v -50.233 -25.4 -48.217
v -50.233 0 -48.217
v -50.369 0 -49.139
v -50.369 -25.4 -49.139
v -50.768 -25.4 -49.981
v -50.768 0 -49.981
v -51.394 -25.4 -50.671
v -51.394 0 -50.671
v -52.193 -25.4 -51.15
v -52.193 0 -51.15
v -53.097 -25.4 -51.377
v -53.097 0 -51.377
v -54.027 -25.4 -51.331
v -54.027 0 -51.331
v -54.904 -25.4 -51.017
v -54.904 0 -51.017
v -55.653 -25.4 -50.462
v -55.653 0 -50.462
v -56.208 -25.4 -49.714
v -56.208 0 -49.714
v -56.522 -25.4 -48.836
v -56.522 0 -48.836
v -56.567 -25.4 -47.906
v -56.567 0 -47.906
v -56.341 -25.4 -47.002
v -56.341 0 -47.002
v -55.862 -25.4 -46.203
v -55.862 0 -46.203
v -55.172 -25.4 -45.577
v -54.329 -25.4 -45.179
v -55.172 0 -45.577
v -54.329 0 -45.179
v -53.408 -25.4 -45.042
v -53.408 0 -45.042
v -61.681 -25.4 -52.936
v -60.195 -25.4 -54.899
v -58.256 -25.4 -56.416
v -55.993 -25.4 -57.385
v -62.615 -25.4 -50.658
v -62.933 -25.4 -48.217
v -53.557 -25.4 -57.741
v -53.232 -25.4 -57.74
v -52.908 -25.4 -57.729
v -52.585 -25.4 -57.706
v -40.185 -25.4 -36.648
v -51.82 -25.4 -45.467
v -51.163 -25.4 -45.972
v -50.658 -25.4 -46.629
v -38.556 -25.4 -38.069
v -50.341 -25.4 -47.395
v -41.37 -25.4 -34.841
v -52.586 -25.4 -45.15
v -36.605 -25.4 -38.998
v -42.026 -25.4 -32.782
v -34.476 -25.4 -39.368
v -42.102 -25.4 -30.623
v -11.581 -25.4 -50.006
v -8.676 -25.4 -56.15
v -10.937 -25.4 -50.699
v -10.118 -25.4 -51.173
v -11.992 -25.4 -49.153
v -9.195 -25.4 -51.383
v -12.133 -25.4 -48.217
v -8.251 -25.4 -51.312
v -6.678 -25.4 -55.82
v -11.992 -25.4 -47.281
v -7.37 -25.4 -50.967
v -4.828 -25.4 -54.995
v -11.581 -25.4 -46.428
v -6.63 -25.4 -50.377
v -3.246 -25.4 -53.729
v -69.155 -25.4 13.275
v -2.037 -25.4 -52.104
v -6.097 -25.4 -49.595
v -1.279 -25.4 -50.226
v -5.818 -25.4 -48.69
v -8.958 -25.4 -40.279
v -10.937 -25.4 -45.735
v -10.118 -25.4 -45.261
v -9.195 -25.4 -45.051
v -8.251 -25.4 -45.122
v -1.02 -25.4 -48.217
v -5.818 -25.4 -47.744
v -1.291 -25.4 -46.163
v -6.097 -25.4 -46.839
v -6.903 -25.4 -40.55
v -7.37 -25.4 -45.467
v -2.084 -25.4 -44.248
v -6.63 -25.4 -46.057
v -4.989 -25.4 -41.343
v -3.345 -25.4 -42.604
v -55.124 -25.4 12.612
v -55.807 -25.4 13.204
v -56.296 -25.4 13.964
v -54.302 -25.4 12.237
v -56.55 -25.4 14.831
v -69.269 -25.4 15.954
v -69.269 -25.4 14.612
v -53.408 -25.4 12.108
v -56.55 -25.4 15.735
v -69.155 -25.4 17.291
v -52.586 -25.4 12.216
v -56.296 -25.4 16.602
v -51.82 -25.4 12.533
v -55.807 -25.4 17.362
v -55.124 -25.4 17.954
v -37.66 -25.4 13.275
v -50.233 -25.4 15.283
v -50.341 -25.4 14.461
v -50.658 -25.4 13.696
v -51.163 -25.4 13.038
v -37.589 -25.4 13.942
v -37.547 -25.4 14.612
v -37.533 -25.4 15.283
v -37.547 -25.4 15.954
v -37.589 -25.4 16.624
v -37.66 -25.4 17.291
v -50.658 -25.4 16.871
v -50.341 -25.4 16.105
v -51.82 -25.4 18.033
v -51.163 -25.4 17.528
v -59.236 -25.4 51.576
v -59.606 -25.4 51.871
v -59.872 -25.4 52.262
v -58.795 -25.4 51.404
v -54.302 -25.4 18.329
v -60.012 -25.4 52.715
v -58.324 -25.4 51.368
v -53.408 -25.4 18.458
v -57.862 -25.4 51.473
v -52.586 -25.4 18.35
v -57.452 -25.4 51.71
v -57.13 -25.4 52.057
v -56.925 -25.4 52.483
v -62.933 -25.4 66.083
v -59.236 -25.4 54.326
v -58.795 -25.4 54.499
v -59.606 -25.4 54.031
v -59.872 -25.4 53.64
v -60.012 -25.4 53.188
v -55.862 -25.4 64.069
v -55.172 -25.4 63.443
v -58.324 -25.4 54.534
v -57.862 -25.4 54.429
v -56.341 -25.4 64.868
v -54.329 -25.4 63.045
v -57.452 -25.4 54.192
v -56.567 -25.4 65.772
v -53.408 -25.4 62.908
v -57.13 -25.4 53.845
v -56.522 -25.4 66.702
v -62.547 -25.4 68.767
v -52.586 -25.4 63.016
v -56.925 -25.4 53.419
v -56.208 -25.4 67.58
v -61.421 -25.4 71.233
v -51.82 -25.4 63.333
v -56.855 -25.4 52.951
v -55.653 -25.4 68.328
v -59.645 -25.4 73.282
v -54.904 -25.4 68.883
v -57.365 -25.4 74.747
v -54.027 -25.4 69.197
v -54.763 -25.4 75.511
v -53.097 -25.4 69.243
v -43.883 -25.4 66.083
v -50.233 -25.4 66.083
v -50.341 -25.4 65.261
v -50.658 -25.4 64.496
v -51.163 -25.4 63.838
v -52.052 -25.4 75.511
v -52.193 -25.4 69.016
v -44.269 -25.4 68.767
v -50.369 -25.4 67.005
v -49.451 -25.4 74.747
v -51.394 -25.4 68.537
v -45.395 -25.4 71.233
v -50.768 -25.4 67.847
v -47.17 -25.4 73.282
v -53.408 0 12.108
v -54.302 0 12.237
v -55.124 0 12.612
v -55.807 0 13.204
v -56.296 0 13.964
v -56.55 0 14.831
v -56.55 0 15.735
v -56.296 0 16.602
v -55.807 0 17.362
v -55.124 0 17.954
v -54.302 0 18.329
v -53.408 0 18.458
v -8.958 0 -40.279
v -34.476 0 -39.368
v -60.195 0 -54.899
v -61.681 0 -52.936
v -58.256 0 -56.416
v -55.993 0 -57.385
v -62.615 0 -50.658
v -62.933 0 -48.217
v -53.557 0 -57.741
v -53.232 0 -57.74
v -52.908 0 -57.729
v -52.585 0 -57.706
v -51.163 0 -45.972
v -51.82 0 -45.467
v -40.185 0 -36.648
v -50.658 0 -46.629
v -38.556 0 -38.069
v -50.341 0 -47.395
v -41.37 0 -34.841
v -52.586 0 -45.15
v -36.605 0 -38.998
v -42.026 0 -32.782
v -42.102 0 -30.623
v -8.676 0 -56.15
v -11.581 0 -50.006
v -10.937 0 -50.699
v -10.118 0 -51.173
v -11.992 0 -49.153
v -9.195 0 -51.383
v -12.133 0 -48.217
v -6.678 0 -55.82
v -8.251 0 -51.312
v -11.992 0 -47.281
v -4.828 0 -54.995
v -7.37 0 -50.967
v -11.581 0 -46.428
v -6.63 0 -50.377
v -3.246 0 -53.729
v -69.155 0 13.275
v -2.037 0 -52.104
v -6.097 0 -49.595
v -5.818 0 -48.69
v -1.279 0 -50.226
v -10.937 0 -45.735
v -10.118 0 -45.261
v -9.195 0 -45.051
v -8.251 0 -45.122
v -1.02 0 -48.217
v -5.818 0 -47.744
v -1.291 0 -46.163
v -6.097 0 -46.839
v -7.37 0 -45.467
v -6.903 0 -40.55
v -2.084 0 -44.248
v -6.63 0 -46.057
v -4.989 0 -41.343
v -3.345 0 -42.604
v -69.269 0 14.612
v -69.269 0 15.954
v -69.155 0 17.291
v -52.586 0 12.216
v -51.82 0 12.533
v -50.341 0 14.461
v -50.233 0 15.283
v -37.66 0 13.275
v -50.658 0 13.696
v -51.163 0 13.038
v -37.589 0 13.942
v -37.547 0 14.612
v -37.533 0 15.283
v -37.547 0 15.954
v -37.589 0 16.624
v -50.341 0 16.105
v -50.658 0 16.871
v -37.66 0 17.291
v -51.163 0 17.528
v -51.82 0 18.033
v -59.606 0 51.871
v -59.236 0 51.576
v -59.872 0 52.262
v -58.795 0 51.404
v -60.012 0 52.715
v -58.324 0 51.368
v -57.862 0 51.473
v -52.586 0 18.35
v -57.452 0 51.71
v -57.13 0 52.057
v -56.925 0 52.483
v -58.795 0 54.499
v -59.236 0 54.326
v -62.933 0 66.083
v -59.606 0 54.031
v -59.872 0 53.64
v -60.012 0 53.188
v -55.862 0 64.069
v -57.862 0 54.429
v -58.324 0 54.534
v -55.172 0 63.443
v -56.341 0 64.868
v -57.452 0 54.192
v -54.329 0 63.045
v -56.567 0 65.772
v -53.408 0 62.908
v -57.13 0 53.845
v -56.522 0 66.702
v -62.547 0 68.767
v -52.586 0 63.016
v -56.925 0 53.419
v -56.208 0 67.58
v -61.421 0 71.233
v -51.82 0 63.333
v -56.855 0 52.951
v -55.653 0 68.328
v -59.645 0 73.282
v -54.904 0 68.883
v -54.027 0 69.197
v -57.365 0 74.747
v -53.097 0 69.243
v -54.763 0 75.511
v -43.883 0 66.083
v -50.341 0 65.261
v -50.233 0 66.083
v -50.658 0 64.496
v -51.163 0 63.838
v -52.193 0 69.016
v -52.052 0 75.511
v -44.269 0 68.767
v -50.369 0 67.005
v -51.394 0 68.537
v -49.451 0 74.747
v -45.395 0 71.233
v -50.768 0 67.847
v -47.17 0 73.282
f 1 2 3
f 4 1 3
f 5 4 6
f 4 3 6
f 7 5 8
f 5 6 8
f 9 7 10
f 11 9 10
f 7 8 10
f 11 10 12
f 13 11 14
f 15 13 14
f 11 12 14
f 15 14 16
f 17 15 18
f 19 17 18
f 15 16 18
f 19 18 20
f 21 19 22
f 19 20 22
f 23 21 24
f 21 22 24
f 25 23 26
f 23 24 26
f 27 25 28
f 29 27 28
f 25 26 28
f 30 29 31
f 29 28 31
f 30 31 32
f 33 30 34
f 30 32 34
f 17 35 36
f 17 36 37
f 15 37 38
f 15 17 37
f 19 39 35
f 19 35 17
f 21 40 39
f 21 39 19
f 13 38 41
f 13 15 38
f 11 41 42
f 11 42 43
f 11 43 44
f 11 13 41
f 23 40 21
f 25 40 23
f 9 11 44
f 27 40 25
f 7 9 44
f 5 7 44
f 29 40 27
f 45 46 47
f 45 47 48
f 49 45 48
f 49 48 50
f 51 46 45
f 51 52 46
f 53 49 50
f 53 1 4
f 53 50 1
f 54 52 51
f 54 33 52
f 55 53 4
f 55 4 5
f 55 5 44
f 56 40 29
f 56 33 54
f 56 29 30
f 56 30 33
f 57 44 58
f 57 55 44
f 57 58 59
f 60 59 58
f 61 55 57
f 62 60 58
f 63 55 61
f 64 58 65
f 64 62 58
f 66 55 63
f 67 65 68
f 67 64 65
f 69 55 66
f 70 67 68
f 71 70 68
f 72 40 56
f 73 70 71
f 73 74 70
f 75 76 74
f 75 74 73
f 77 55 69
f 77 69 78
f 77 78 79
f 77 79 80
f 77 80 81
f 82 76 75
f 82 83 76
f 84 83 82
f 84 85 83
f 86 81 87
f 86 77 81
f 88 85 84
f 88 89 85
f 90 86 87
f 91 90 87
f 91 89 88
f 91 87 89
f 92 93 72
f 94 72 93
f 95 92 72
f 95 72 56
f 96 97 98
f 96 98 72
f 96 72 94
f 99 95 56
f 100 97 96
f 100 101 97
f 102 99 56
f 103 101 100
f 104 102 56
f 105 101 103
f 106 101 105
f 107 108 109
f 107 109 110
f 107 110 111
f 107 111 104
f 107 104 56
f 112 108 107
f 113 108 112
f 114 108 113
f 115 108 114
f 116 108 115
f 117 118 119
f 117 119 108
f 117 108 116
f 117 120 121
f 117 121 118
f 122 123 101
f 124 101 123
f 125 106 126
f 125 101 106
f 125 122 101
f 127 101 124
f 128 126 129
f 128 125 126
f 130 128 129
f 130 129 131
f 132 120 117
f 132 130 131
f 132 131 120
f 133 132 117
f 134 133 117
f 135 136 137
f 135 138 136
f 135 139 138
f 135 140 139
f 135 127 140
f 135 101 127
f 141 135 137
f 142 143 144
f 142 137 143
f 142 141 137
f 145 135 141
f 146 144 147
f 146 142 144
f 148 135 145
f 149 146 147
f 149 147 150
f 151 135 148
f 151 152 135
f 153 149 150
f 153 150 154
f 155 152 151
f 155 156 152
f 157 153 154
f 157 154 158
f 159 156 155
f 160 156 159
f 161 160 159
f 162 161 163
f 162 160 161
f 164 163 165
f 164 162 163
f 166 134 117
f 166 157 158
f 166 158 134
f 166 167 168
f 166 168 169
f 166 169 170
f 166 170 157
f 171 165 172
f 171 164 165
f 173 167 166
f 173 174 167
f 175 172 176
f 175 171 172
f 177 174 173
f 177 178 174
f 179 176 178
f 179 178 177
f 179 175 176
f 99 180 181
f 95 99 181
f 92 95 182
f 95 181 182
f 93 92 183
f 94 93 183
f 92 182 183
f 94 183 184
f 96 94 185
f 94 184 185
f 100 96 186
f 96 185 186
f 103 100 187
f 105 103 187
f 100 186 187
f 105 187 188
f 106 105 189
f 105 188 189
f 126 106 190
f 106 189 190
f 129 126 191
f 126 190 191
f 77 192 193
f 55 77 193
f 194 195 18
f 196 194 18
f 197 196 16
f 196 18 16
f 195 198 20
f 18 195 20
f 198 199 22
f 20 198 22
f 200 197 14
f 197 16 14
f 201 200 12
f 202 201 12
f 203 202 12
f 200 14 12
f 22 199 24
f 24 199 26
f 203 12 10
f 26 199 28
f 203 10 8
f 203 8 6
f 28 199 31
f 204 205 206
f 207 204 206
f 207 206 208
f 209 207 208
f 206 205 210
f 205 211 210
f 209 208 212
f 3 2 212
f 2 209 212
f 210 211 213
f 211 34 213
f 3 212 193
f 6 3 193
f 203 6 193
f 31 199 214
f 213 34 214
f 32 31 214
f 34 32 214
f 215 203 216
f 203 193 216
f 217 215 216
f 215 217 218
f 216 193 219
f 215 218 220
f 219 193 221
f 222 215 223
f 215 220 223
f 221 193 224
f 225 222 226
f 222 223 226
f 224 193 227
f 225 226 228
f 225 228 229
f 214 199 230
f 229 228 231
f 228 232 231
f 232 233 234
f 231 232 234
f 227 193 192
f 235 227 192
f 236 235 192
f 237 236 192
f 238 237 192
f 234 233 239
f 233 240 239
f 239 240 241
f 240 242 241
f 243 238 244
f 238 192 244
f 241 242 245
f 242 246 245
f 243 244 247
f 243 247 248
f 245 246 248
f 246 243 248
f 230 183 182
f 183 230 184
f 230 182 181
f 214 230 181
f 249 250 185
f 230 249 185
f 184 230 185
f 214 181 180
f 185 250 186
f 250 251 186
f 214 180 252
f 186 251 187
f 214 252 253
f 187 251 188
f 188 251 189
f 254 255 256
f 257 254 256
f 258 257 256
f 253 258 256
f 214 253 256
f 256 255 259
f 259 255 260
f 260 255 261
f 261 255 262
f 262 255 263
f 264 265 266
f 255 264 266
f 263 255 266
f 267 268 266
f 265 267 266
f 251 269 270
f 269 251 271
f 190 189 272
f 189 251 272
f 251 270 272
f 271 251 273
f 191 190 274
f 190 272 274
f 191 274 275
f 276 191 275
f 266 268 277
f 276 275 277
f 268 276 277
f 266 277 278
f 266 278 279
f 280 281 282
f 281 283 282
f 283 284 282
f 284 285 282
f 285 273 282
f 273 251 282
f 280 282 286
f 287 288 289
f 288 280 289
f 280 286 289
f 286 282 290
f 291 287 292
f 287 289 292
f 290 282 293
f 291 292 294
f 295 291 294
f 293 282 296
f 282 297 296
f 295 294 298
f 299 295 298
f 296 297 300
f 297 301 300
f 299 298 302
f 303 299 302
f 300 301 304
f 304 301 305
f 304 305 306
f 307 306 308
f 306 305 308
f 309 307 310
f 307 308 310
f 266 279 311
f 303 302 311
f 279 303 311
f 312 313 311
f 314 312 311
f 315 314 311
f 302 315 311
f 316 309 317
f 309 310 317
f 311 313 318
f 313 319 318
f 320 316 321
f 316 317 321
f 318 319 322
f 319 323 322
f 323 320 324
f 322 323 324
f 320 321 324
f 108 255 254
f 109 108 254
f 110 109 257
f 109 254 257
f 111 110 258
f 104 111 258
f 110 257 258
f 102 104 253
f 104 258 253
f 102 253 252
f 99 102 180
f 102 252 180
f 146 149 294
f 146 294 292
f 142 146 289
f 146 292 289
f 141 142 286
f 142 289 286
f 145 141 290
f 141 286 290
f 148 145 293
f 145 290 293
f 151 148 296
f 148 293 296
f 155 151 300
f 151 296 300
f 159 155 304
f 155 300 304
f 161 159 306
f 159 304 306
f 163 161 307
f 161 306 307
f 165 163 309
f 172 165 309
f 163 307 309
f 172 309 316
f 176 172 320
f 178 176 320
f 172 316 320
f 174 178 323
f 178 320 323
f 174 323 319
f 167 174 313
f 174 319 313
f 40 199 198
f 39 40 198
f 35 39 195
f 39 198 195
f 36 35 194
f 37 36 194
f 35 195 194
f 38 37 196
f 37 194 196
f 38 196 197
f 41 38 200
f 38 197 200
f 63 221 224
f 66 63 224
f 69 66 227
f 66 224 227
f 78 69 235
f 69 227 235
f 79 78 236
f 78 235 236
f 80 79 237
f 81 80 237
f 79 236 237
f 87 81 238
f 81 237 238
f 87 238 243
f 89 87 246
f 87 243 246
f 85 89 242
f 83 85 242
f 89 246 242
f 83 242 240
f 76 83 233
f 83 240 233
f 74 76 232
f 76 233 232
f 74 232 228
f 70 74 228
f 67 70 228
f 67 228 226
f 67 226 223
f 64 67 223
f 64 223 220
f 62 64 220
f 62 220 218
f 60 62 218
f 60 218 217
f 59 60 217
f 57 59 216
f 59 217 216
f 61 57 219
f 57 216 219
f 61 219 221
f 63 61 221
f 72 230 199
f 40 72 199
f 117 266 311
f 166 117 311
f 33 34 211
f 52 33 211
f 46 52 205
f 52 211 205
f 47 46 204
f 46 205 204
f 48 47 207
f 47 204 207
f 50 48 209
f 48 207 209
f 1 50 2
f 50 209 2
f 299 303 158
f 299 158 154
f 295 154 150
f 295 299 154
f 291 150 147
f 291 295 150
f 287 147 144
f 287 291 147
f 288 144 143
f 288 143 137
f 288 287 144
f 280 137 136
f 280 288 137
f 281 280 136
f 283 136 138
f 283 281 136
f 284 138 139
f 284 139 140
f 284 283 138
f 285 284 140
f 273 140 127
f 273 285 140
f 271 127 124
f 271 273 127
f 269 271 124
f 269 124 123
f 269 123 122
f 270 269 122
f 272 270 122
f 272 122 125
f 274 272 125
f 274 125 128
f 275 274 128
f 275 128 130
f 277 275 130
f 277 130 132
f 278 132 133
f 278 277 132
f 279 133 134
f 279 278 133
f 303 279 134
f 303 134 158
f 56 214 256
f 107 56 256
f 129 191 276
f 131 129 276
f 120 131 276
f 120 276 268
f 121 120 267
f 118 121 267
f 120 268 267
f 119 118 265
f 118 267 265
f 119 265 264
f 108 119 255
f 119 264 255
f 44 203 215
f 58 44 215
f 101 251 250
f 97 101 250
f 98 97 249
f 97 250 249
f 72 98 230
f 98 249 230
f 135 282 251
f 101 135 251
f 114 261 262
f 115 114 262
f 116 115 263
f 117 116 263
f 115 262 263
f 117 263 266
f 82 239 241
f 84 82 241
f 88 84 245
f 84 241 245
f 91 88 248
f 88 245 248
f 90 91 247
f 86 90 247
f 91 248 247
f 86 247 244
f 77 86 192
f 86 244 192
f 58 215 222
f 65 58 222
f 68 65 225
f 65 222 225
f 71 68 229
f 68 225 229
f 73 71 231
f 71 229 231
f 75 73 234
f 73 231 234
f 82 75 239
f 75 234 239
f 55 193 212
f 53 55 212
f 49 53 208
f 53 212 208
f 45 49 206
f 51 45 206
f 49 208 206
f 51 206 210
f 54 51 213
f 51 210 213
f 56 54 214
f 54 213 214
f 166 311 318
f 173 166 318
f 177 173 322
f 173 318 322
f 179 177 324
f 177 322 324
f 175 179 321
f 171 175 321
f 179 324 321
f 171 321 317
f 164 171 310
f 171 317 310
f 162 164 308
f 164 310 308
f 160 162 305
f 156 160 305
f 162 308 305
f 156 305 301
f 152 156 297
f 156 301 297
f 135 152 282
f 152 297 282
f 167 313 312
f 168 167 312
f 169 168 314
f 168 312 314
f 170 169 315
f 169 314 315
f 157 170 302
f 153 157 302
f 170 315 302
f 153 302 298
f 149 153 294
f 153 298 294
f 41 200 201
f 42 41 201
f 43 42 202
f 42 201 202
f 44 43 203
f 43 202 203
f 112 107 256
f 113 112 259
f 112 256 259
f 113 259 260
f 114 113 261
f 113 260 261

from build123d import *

# Parameters (mm, degrees)
F0_R     = 1.5875
F1_DEPTH = 25.4


with BuildPart() as f1:
    # F0 (on Front) → F1 (new body)
    with BuildSketch(Plane.XZ):
        with BuildLine():
            ThreePointArc((-53.4077063203, 56.5580051482), (-46.6725142295, 59.3478130574), (-43.8827063203, 66.0830051482))
            ThreePointArc((-43.8827063203, 66.0830051482), (-53.4077063203, 75.6080051482), (-62.9327063203, 66.0830051482))
            ThreePointArc((-62.9327063203, 66.0830051482), (-60.1428984111, 59.3478130574), (-53.4077063203, 56.5580051482))
        make_face()
        with BuildLine():
            ThreePointArc((-50.2327063203, 66.0830051482), (-51.16264229, 63.8379411179), (-53.4077063203, 62.9080051482))
            ThreePointArc((-53.4077063203, 62.9080051482), (-55.6527703506, 68.3280691784), (-50.2327063203, 66.0830051482))
        make_face(mode=Mode.SUBTRACT)
        with BuildLine():
            Line((-37.6602494156, 17.2912944785), (-43.8827063203, 66.0830051482))
            ThreePointArc((-43.8827063203, 66.0830051482), (-46.6725142295, 59.3478130574), (-53.4077063203, 56.5580051482))
            Line((-53.4077063203, 56.5580051482), (-53.4077063203, 31.1580051482))
            ThreePointArc((-53.4077063203, 31.1580051482), (-42.9164234654, 27.1972239249), (-37.6602494156, 17.2912944785))
        make_face()
        with BuildLine():
            ThreePointArc((-53.4077063203, 56.5580051482), (-60.1428984111, 59.3478130574), (-62.9327063203, 66.0830051482))
            Line((-62.9327063203, 66.0830051482), (-69.155163225, 17.2912944785))
            ThreePointArc((-69.155163225, 17.2912944785), (-63.8989891751, 27.1972239249), (-53.4077063203, 31.1580051482))
            Line((-53.4077063203, 31.1580051482), (-53.4077063203, 56.5580051482))
        make_face()
        with Locations((-58.4421381354, 52.9512051482)):
            Circle(F0_R, mode=Mode.SUBTRACT)
        with BuildLine():
            ThreePointArc((-37.5327063203, 15.2830051482), (-37.5646241807, 16.2891727877), (-37.6602494156, 17.2912944785))
            ThreePointArc((-37.6602494156, 17.2912944785), (-42.9164234654, 27.1972239249), (-53.4077063203, 31.1580051482))
            Line((-53.4077063203, 31.1580051482), (-53.4077063203, 18.4580051482))
            ThreePointArc((-53.4077063203, 18.4580051482), (-51.16264229, 17.5280691784), (-50.2327063203, 15.2830051482))
            ThreePointArc((-50.2327063203, 15.2830051482), (-51.16264229, 13.0379411179), (-53.4077063203, 12.1080051482))
            Line((-53.4077063203, 12.1080051482), (-53.4077063203, -0.5919948518))
            ThreePointArc((-53.4077063203, -0.5919948518), (-42.9164234654, 3.3687863714), (-37.6602494156, 13.2747158178))
            ThreePointArc((-37.6602494156, 13.2747158178), (-37.5646241807, 14.2768375086), (-37.5327063203, 15.2830051482))
        make_face()
        with BuildLine():
            ThreePointArc((-53.4077063203, 31.1580051482), (-63.8989891751, 27.1972239249), (-69.155163225, 17.2912944785))
            ThreePointArc((-69.155163225, 17.2912944785), (-69.2827063203, 15.2830051482), (-69.155163225, 13.2747158178))
            ThreePointArc((-69.155163225, 13.2747158178), (-63.8989891751, 3.3687863714), (-53.4077063203, -0.5919948518))
            Line((-53.4077063203, -0.5919948518), (-53.4077063203, 12.1080051482))
            ThreePointArc((-53.4077063203, 12.1080051482), (-56.5827063203, 15.2830051482), (-53.4077063203, 18.4580051482))
            Line((-53.4077063203, 18.4580051482), (-53.4077063203, 31.1580051482))
        make_face()
        with BuildLine():
            ThreePointArc((-53.4077063203, -0.5919948518), (-63.8989891751, 3.3687863714), (-69.155163225, 13.2747158178))
            Line((-69.155163225, 13.2747158178), (-62.9327063203, -48.2169948518))
            ThreePointArc((-62.9327063203, -48.2169948518), (-60.1428984111, -41.481802761), (-53.4077063203, -38.6919948518))
            Line((-53.4077063203, -38.6919948518), (-53.4077063203, -0.5919948518))
        make_face()
        with BuildLine():
            Line((-42.102295446, -30.6225764362), (-37.6602494156, 13.2747158178))
            ThreePointArc((-37.6602494156, 13.2747158178), (-42.9164234654, 3.3687863714), (-53.4077063203, -0.5919948518))
            Line((-53.4077063203, -0.5919948518), (-53.4077063203, -38.6919948518))
            ThreePointArc((-53.4077063203, -38.6919948518), (-46.6725142295, -41.481802761), (-43.8827063203, -48.2169948518))
            Line((-43.8827063203, -48.2169948518), (-16.8952063203, -48.2169948518))
            ThreePointArc((-16.8952063203, -48.2169948518), (-14.570366396, -42.6043347762), (-8.9577063203, -40.2794948518))
            Line((-8.9577063203, -40.2794948518), (-34.4762444457, -39.3681184902))
            ThreePointArc((-34.4762444457, -39.3681184902), (-40.1845456585, -36.6480145197), (-42.102295446, -30.6225764362))
        make_face()
        with BuildLine():
            ThreePointArc((-53.4077063203, -38.6919948518), (-60.1428984111, -41.481802761), (-62.9327063203, -48.2169948518))
            ThreePointArc((-62.9327063203, -48.2169948518), (-60.1953592391, -54.8993142736), (-53.556665826, -57.7408300071))
            Line((-53.556665826, -57.7408300071), (-52.5845948483, -57.7063632452))
            ThreePointArc((-52.5845948483, -57.7063632452), (-46.3875296213, -54.6545987628), (-43.8827063203, -48.2169948518))
            Line((-43.8827063203, -48.2169948518), (-50.2327063203, -48.2169948518))
            ThreePointArc((-50.2327063203, -48.2169948518), (-55.6527703506, -50.4620588821), (-53.4077063203, -45.0419948518))
            Line((-53.4077063203, -45.0419948518), (-53.4077063203, -38.6919948518))
        make_face()
        with BuildLine():
            Line((-52.5845948483, -57.7063632452), (-53.556665826, -57.7408300071))
            ThreePointArc((-53.556665826, -57.7408300071), (-53.0701900869, -57.7360130676), (-52.5845948483, -57.7063632452))
        make_face()
        with BuildLine():
            Line((-16.8952063203, -48.2169948518), (-43.8827063203, -48.2169948518))
            ThreePointArc((-43.8827063203, -48.2169948518), (-46.3875296213, -54.6545987628), (-52.5845948483, -57.7063632452))
            Line((-52.5845948483, -57.7063632452), (-8.6764427924, -56.1495100316))
            ThreePointArc((-8.6764427924, -56.1495100316), (-14.4700278366, -53.9282309484), (-16.8952063203, -48.2169948518))
        make_face()
        with BuildLine():
            ThreePointArc((-1.0202063203, -48.2169948518), (-3.3450462446, -42.6043347762), (-8.9577063203, -40.2794948518))
            ThreePointArc((-8.9577063203, -40.2794948518), (-14.570366396, -42.6043347762), (-16.8952063203, -48.2169948518))
            ThreePointArc((-16.8952063203, -48.2169948518), (-14.4700278366, -53.9282309484), (-8.6764427924, -56.1495100316))
            ThreePointArc((-8.6764427924, -56.1495100316), (-3.2464702237, -53.7293163681), (-1.0202063203, -48.2169948518))
        make_face()
        with BuildLine():
            ThreePointArc((-5.7827063203, -48.2169948518), (-8.9577063203, -51.3919948518), (-12.1327063203, -48.2169948518))
            ThreePointArc((-12.1327063203, -48.2169948518), (-8.9577063203, -45.0419948518), (-5.7827063203, -48.2169948518))
        make_face(mode=Mode.SUBTRACT)
        with BuildLine():
            ThreePointArc((-43.8827063203, -48.2169948518), (-46.6725142295, -41.481802761), (-53.4077063203, -38.6919948518))
            Line((-53.4077063203, -38.6919948518), (-53.4077063203, -45.0419948518))
            ThreePointArc((-53.4077063203, -45.0419948518), (-51.16264229, -45.9719308216), (-50.2327063203, -48.2169948518))
            Line((-50.2327063203, -48.2169948518), (-43.8827063203, -48.2169948518))
        make_face()
    extrude(amount=F1_DEPTH)


solid = f1.part
